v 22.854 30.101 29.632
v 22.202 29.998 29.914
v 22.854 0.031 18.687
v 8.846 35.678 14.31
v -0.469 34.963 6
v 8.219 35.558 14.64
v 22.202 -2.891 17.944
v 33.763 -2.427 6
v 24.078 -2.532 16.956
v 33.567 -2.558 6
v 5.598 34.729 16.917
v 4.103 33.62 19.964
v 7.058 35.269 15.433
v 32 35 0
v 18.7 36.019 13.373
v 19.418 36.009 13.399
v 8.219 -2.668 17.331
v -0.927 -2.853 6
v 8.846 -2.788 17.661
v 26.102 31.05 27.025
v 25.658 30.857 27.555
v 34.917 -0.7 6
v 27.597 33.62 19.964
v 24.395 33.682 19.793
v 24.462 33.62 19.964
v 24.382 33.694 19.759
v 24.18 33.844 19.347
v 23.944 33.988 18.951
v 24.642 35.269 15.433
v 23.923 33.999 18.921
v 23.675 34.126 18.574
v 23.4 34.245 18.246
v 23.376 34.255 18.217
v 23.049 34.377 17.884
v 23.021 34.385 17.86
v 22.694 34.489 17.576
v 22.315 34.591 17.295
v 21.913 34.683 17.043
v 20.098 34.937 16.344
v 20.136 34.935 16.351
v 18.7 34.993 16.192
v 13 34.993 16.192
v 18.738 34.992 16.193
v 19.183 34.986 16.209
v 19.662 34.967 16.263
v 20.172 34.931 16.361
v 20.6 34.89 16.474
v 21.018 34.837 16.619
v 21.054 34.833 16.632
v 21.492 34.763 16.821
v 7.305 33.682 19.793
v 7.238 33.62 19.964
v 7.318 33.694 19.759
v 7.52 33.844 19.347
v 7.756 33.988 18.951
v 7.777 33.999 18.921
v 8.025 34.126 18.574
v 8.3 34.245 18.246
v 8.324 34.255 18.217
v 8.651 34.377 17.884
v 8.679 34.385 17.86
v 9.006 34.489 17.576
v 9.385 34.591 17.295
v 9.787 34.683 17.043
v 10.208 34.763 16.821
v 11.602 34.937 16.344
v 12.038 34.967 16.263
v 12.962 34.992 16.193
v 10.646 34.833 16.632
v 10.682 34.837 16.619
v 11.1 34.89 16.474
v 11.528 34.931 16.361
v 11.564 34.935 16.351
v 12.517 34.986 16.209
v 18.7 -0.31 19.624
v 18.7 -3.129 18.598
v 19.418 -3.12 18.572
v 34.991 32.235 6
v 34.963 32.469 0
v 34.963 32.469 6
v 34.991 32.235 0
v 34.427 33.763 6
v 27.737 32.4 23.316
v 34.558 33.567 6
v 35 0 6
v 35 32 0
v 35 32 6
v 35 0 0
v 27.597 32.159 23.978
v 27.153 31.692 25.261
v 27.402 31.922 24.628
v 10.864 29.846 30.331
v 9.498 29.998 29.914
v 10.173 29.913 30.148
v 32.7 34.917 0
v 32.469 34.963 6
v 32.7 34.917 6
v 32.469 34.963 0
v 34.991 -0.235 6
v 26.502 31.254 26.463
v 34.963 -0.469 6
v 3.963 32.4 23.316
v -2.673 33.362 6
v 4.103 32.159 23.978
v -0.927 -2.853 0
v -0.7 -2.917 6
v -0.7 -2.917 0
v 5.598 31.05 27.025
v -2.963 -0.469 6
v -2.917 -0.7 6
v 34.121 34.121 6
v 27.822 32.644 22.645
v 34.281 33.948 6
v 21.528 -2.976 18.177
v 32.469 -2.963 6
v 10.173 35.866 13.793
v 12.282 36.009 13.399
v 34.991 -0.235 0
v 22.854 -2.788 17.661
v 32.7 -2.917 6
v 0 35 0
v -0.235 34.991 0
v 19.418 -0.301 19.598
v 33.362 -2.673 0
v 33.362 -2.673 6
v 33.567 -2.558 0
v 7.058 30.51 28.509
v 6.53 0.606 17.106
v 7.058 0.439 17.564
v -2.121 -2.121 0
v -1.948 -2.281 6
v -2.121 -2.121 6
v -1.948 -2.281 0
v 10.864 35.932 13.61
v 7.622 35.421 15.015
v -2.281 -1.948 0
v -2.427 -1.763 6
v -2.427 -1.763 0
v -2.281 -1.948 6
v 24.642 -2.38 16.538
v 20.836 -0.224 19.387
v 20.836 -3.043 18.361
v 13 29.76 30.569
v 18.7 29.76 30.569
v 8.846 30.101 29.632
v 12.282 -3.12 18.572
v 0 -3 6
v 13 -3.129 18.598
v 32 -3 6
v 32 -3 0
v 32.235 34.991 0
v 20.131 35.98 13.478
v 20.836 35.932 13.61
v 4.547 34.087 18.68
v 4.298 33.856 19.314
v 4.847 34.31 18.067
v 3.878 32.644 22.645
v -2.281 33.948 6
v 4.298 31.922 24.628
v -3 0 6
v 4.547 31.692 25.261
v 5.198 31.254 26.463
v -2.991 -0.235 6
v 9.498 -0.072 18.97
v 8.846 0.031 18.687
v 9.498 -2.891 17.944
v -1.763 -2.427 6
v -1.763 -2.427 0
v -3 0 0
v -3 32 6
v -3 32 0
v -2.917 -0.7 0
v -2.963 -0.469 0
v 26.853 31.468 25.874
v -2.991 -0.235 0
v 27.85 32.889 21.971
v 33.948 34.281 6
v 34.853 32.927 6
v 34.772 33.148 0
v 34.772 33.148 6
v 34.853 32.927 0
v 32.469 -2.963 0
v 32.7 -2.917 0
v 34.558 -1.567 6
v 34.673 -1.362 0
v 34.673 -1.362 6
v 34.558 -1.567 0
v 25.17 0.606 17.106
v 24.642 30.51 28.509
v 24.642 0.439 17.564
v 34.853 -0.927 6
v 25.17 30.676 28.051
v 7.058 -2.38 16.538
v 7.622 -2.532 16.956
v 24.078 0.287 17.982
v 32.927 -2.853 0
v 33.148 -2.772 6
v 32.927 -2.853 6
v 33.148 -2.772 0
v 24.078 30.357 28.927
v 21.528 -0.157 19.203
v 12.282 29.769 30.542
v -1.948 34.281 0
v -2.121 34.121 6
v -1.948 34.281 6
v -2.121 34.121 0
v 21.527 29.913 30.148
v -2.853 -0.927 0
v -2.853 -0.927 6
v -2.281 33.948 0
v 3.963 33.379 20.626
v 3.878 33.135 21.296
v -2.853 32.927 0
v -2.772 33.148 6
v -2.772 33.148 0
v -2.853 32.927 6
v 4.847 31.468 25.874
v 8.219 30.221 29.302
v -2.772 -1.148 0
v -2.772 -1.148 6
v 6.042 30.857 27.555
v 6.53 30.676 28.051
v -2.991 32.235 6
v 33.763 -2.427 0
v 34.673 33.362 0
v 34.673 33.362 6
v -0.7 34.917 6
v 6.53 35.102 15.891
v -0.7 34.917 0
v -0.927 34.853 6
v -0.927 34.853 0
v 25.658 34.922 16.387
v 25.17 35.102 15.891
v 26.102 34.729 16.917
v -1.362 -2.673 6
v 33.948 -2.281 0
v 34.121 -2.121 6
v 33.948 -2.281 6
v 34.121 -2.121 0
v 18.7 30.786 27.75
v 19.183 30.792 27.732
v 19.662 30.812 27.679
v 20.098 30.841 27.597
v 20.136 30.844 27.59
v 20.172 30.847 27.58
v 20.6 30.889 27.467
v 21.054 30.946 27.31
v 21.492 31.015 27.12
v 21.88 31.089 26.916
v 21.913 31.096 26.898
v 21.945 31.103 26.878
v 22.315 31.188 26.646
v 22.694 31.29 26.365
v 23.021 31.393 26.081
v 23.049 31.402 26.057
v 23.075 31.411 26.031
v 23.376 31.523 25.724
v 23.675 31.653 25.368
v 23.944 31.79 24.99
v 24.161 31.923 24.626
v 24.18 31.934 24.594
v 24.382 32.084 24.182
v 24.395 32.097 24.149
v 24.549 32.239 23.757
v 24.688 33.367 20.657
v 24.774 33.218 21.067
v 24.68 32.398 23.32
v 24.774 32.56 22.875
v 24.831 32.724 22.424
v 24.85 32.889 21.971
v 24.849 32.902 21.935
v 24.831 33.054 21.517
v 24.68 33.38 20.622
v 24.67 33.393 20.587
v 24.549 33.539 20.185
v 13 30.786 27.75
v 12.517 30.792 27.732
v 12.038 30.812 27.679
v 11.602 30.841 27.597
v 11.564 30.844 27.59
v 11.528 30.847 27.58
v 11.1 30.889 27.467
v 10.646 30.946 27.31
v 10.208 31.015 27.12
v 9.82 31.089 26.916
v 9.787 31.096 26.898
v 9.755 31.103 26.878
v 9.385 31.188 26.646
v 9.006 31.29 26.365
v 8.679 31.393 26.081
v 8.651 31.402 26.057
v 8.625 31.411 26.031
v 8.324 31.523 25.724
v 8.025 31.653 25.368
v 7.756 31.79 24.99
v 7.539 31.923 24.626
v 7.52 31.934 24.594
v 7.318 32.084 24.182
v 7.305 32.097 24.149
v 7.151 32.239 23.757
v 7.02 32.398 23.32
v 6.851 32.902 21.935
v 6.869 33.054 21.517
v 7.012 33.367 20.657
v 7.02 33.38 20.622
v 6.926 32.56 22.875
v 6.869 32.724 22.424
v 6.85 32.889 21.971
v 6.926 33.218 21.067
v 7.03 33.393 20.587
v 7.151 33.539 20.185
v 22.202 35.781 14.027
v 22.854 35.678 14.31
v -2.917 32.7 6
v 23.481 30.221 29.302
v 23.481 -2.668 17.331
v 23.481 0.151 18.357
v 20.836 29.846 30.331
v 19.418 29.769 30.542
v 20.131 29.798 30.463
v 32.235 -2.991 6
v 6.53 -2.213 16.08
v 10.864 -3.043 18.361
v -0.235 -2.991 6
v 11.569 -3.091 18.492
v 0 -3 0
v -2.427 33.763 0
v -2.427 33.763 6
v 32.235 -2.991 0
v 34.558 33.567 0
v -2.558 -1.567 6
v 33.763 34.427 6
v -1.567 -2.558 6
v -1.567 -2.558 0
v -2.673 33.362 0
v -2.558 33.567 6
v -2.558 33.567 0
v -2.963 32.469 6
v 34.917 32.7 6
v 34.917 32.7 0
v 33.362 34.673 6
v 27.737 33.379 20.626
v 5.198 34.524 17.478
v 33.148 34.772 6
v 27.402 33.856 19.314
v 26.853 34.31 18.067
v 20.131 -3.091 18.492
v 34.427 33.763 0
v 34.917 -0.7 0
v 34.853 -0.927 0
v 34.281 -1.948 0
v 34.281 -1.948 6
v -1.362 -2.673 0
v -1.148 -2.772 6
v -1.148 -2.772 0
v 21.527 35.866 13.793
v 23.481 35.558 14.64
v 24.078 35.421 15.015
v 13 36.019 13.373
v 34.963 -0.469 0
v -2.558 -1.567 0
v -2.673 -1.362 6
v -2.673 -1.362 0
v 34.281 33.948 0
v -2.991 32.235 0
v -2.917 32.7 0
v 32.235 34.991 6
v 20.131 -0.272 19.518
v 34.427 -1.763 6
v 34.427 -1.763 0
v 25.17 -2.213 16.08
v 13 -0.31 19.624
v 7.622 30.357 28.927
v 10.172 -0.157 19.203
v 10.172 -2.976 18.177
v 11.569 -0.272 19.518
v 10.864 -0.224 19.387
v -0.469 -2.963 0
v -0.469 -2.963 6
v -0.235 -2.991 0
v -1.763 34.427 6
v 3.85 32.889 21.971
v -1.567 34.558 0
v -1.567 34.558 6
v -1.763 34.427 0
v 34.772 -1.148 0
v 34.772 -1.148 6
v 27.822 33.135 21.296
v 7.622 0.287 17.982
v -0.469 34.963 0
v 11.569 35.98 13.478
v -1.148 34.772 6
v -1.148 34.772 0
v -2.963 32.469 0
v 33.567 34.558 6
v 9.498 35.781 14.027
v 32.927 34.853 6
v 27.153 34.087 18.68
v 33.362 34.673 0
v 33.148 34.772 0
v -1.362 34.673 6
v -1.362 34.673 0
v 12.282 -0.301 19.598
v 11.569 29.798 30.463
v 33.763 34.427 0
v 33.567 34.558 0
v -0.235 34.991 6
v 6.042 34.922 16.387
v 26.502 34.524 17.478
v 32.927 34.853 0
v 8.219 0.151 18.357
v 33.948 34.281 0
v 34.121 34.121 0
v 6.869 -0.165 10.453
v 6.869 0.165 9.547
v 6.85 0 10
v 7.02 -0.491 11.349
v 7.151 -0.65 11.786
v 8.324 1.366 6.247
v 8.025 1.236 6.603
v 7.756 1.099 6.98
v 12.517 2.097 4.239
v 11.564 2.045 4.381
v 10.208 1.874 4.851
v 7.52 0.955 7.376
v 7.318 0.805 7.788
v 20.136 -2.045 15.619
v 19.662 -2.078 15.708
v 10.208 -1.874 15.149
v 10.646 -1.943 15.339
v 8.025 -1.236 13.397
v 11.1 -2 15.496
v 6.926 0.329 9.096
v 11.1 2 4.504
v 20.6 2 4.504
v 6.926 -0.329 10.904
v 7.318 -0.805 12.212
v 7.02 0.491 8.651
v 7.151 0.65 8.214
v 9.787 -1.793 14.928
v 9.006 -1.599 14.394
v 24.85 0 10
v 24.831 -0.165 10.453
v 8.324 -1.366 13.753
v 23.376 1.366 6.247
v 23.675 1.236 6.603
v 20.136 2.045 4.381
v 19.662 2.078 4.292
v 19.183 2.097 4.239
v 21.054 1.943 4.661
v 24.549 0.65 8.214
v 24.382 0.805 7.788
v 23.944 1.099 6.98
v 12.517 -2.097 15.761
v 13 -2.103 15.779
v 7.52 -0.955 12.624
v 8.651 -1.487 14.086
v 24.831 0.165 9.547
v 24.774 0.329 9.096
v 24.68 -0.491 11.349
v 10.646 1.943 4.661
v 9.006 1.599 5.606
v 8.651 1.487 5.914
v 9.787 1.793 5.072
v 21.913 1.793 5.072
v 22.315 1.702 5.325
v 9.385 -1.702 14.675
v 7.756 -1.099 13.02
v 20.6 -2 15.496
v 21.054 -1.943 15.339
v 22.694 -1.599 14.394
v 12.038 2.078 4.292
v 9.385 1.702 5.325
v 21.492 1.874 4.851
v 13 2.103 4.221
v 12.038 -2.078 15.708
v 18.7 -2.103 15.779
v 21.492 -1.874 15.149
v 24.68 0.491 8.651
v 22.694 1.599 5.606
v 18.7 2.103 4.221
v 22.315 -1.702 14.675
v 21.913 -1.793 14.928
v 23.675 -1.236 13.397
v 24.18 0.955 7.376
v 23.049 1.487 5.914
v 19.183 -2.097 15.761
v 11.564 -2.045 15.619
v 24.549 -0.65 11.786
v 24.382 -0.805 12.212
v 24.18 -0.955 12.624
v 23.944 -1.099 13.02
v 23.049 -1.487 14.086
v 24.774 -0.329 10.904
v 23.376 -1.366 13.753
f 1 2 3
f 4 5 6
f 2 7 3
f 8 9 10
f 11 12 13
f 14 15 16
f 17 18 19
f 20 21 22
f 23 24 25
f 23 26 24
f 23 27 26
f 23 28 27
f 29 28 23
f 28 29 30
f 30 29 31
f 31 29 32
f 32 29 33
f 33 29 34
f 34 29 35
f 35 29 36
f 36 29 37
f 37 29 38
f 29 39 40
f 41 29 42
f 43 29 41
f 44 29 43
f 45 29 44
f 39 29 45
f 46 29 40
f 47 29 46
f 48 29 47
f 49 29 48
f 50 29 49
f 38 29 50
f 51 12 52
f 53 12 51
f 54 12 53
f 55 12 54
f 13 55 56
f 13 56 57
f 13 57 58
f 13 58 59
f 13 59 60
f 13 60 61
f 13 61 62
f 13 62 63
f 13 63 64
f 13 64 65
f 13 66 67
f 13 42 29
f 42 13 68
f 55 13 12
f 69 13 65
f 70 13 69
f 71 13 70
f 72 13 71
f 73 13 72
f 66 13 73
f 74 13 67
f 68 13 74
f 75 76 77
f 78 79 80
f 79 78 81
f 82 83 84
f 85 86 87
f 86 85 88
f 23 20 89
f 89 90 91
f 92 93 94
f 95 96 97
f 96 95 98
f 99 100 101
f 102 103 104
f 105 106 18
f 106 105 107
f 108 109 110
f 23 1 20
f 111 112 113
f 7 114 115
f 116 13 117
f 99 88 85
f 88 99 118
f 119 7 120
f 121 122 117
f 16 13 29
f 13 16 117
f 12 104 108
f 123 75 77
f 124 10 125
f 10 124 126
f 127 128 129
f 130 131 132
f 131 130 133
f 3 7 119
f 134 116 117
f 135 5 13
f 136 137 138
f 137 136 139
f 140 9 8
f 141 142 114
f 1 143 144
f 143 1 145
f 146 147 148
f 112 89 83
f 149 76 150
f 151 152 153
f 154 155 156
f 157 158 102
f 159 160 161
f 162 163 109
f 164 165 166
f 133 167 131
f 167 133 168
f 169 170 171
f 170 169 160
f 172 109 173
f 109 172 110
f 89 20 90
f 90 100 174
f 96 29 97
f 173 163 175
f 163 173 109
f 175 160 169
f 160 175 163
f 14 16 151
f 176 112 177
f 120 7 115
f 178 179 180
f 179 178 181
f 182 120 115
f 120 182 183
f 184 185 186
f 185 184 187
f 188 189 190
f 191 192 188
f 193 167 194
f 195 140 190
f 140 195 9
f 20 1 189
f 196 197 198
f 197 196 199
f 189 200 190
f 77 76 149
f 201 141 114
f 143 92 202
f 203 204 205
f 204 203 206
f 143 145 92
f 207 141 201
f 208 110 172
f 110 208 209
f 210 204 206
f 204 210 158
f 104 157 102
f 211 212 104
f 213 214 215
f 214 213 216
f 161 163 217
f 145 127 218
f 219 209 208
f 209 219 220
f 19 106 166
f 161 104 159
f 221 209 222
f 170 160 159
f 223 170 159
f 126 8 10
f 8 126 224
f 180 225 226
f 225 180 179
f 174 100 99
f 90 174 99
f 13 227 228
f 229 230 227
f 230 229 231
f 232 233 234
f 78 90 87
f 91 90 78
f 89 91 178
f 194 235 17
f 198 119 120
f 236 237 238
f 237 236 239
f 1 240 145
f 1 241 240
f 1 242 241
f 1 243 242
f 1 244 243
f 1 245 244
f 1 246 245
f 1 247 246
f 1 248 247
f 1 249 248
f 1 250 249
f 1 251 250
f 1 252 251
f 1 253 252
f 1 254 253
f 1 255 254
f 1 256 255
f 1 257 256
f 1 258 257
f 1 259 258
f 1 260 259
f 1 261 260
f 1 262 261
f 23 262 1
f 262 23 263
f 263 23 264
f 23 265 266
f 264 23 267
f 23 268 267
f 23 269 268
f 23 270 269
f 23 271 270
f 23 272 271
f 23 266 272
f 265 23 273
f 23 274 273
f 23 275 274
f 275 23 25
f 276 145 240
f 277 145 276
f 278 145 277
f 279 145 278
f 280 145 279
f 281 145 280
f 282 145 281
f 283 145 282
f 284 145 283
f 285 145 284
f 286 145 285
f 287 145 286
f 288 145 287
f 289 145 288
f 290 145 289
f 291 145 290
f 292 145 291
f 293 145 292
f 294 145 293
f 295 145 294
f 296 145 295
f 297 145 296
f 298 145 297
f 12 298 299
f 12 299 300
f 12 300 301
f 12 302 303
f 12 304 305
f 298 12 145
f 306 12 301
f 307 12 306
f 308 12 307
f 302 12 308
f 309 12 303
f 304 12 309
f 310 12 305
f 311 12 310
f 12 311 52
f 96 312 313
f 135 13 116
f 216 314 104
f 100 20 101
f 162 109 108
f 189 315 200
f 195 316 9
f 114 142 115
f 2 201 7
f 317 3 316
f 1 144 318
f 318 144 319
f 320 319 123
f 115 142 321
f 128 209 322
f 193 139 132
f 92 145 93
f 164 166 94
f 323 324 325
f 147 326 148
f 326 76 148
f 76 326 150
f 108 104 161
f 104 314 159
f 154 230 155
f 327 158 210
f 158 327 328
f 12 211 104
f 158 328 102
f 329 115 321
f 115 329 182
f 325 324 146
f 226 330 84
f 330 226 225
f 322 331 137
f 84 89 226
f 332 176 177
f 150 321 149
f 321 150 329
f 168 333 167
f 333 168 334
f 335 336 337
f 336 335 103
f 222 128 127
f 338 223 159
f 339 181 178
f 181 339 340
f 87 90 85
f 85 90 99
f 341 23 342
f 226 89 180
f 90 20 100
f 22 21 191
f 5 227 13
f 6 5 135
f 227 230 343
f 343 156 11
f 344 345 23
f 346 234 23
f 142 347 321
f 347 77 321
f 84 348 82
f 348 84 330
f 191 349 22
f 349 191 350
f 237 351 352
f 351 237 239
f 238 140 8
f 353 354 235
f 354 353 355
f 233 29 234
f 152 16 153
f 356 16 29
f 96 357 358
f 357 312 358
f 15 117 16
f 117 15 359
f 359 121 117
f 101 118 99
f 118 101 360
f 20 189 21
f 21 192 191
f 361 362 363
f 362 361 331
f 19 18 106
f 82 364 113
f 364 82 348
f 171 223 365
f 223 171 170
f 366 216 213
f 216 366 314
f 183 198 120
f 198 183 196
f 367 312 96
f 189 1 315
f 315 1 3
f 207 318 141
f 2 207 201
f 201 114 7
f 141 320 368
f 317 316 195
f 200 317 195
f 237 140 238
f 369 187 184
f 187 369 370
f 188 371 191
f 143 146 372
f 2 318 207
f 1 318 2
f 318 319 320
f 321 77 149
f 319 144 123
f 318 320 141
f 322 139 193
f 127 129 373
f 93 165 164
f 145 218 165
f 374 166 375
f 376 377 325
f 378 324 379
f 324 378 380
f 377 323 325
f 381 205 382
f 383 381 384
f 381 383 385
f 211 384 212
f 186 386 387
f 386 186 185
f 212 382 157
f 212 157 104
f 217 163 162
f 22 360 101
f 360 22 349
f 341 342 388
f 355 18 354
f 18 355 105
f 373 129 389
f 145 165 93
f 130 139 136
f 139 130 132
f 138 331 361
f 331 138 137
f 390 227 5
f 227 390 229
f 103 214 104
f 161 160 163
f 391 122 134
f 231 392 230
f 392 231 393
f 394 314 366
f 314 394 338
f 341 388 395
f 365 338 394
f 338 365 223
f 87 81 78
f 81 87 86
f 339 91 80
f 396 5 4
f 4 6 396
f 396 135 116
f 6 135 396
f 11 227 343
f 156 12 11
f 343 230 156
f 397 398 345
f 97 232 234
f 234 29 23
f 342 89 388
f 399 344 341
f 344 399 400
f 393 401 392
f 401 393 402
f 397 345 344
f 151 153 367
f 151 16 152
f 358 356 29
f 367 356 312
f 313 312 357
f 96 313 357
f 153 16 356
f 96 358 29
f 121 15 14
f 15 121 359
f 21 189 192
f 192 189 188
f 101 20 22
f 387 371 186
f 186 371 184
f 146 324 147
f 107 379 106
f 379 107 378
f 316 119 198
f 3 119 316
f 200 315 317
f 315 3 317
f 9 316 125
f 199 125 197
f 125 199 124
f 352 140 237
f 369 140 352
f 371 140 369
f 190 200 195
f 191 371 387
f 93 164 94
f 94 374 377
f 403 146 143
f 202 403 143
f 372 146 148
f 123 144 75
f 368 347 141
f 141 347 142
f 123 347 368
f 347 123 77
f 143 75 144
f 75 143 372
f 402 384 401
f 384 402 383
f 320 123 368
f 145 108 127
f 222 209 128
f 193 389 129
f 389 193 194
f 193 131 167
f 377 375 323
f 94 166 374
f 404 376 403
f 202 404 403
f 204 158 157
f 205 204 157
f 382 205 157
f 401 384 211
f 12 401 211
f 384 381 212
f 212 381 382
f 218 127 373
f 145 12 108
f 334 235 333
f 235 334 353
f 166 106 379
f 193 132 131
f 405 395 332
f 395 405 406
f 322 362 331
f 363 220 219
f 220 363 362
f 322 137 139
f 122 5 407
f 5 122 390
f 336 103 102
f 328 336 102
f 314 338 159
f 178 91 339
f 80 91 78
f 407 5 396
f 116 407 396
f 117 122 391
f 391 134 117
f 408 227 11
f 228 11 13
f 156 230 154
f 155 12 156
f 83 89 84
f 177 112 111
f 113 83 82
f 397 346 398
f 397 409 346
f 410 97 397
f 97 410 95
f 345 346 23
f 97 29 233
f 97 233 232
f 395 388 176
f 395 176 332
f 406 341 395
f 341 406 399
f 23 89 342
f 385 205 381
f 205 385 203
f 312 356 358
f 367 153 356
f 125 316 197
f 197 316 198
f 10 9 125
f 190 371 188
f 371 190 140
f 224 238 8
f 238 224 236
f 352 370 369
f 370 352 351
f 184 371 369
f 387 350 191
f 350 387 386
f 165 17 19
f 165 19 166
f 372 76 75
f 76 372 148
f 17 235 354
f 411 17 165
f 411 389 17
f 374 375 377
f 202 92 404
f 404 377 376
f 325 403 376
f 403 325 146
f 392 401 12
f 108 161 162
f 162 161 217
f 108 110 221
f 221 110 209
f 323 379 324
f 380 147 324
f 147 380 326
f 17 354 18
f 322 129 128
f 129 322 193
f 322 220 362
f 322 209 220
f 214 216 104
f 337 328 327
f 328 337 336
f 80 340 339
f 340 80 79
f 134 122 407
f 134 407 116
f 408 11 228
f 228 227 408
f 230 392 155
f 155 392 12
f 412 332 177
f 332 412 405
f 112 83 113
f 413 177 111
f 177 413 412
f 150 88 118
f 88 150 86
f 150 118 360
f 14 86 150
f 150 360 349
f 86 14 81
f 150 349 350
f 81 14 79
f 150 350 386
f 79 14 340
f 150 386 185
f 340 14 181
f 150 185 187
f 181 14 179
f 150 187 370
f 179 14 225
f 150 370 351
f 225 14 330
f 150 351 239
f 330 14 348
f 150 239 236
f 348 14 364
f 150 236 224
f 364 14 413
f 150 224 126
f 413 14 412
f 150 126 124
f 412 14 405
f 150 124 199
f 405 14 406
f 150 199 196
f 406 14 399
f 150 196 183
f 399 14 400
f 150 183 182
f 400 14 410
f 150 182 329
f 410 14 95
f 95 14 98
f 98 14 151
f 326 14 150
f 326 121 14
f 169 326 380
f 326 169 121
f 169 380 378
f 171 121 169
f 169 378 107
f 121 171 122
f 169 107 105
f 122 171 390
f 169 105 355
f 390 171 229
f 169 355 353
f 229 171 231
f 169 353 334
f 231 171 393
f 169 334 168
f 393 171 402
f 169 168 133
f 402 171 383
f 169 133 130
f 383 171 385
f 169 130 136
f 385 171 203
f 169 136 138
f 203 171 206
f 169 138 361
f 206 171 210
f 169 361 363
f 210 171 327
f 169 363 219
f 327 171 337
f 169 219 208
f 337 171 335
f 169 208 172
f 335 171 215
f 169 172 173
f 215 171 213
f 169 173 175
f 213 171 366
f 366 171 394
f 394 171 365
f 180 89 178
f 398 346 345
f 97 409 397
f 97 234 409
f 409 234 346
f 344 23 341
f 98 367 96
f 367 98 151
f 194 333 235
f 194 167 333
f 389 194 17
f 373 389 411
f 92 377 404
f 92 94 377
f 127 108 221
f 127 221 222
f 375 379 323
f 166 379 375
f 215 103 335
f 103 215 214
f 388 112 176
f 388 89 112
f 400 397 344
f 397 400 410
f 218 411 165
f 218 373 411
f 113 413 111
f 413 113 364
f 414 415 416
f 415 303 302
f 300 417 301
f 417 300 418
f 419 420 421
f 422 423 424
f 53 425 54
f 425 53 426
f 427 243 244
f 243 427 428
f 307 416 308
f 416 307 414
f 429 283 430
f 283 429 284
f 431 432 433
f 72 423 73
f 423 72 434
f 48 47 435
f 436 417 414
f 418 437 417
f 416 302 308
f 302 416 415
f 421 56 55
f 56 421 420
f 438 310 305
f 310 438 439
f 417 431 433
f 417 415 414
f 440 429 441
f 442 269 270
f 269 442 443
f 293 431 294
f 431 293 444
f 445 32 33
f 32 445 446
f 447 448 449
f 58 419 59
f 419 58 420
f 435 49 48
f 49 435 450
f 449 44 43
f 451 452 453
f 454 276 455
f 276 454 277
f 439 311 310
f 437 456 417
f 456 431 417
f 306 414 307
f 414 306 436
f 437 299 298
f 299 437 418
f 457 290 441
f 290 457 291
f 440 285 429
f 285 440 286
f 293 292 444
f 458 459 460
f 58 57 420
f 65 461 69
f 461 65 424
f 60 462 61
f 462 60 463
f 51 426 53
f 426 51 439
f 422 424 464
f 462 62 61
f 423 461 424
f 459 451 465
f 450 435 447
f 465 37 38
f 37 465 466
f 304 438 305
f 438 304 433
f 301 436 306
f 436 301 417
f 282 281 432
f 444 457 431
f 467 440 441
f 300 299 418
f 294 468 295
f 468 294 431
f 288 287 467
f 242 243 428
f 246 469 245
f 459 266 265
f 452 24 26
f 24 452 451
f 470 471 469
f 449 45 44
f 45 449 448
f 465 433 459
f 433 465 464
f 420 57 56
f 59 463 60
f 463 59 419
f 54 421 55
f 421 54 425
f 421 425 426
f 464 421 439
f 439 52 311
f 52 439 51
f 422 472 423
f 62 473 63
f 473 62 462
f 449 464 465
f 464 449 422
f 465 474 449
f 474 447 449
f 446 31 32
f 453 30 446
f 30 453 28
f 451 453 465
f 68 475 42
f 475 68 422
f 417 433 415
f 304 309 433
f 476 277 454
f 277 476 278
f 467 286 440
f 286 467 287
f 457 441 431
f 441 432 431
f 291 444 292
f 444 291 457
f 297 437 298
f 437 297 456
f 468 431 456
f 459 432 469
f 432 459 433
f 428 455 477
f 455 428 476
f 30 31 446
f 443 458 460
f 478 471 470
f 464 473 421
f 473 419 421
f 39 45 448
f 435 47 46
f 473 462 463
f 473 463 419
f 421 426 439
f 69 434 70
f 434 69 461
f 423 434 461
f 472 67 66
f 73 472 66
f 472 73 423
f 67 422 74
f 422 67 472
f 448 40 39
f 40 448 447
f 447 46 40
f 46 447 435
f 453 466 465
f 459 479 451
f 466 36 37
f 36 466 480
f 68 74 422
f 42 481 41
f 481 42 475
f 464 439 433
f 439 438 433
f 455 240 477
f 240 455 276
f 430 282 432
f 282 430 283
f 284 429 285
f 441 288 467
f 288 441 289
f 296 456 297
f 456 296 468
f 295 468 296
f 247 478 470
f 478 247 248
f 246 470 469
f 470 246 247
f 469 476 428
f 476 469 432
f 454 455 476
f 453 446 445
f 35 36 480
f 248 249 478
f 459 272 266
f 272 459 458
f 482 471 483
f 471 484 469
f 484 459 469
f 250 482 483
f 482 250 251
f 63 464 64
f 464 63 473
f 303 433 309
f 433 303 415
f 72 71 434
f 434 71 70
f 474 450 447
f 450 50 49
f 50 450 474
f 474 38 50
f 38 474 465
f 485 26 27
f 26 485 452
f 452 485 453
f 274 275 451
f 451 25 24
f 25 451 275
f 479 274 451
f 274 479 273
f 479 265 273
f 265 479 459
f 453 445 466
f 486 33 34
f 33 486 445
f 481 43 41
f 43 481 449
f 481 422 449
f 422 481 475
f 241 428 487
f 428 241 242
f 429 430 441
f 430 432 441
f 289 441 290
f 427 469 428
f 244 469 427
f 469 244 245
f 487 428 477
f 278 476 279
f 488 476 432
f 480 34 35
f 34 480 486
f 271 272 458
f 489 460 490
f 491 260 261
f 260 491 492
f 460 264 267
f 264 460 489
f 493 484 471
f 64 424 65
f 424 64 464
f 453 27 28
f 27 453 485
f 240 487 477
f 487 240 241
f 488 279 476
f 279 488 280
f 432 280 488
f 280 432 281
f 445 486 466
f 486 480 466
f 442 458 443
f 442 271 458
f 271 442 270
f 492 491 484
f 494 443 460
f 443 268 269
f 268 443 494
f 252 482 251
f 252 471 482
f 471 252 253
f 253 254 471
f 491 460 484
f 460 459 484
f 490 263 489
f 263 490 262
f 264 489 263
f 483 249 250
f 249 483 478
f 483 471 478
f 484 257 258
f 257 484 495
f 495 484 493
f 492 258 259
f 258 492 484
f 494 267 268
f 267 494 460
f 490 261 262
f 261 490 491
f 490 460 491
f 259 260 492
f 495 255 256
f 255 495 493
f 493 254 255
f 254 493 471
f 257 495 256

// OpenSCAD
/*
 * an end bracket for phone mount
 */

$fn=80;

width=12.3;
length=18.0;
wall_thickness = 3;
base_side = 35;

module receiver_shape(width, length) {
   hull() {
      circle(d=width);
      translate([length-width, 0, 0])
         circle(d=width);
   }
}

module receiver_2d() {
   difference() {
      receiver_shape(width+2*wall_thickness, length+2*wall_thickness);
      receiver_shape(width, length);
   }
}

module base_2d() {
   minkowski() {
      square(32);
      circle(3);
   }
}

module receiver_hole() {
   linear_extrude(base_side+wall_thickness)
      receiver_shape(width, length);
}

module base() {
   linear_extrude(wall_thickness*2)
      base_2d();
}

module receiver() {
   linear_extrude(wall_thickness)
      receiver_shape(width+2*wall_thickness, length+2*wall_thickness);
   linear_extrude(base_side)
      receiver_2d();
}

difference() {
   hull() {
      translate([13.0, 0, 10])
         rotate([-70, 0, 0])
            receiver();
      base();
   }

   translate([13.0, 0, 10])
      rotate([-70, 0, 0])
         receiver_hole();
}
